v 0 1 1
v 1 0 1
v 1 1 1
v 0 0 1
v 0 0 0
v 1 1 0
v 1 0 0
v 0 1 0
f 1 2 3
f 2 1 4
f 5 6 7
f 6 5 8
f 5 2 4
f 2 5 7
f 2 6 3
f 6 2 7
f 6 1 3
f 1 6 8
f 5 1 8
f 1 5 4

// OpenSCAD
polyhedron(
  points=[
    [0, 0, 0],
    [1, 0, 0],
    [0, 1, 0],
    [1, 1, 0],
    [0, 0, 1],
    [1, 0, 1],
    [0, 1, 1],
    [1, 1, 1],
  ],
  faces=[
    [6,7,5,4],
    [0,1,3,2],
    [4,5,1,0],
    [5,7,3,1],
    [7,6,2,3],
    [6,4,0,2],
  ]);
